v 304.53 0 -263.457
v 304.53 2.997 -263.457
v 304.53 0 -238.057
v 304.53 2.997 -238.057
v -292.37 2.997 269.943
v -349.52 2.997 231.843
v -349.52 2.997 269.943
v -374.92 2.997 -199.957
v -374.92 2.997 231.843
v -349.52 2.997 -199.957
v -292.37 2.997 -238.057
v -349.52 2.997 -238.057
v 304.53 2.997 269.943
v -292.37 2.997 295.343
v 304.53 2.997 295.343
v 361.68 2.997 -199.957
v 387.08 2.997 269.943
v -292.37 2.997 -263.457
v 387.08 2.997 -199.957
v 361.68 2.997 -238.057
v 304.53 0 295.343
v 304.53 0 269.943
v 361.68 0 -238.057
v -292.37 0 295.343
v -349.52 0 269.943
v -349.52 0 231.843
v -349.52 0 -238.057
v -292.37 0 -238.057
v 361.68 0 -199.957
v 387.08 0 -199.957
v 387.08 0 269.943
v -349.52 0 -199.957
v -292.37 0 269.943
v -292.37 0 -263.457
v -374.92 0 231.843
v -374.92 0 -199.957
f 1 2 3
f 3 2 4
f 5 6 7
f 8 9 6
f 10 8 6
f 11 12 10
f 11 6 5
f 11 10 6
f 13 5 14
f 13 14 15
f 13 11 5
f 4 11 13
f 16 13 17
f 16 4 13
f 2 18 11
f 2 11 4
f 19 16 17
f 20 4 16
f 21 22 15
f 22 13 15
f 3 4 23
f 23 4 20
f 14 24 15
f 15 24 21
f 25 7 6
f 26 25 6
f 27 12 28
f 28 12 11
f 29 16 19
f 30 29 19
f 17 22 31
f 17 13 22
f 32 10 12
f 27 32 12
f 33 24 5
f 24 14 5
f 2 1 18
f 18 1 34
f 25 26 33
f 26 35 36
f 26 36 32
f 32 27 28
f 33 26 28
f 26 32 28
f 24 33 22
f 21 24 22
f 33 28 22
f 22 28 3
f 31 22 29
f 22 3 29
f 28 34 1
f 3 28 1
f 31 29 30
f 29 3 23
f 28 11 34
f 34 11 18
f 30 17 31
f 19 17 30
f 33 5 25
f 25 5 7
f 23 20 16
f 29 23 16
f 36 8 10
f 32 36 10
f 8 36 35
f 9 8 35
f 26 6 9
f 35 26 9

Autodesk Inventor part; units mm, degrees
ref_plane "YZ Plane" through (0, 0, 0) normal (1, 0, 0) x (0, 1, 0)
sketch "Sketch1" plane through (0, 0, 0) normal (0, 1, 0) x (-1, 0, 0)
  line L0 (374.9202, 295.3426) -> (-387.0798, 295.3426)
  line L1 (-387.0798, 295.3426) -> (-387.0798, -263.4574)
  line L2 (-387.0798, -263.4574) -> (374.9202, -263.4574)
  line L3 (374.9202, -263.4574) -> (374.9202, 295.3426)
  point P0 (0, 0)
  dimension "d0" = 558.8
  dimension "d1" = 762
extrude "Extrusion1" add sketch "Sketch1" along normal blind 2.9972
sketch "Sketch2" plane through (0, 2.9972, 0) normal (0, 1, 0) x (1, 0, 0)
  line L0 (-374.9202, -231.8426) -> (-374.9202, -295.3426)
  line L1 (-374.9202, -295.3426) -> (-292.3702, -295.3426)
  line L2 (-292.3702, -295.3426) -> (-292.3702, -269.9426)
  line L3 (-292.3702, -269.9426) -> (-349.5202, -269.9426)
  line L4 (-349.5202, -269.9426) -> (-349.5202, -231.8426)
  line L5 (-349.5202, -231.8426) -> (-374.9202, -231.8426)
  line L6 (-374.9202, 263.4574) -> (-374.9202, -295.3426) projected
  line L7 (-374.9202, -295.3426) -> (387.0798, -295.3426) projected
  point P0 (0, 0)
  dimension "d4" = 63.5
  dimension "d5" = 82.55
  dimension "d6" = 25.4
  dimension "d7" = 25.4
extrude "Extrusion2" cut sketch "Sketch2" against normal blind 2.9972
ref_plane "Work Plane3" through (-292.3702, 0, 15.9426) normal (0, 0, 1) x (1, 0, 0)
mirror "Mirror1" about plane through (-292.3702, 0, 15.9426) normal (0, 0, 1) of "Extrusion2"
ref_plane "Work Plane4" through (6.0798, 0, -199.9574) normal (-1, 0, 0) x (0, 0, 1)
mirror "Mirror2" about plane through (6.0798, 0, -199.9574) normal (-1, 0, 0) of "Extrusion2", "Mirror1"
sketch "Sketch3" plane through (0, 2.9972, 0) normal (0, 1, 0) x (1, 0, 0)
  line L0 (387.0798, -231.8426) -> (387.0798, 199.9574) projected
  line L1 (304.5298, -269.9426) -> (361.6798, -269.9426) projected
  line L2 (387.0798, -231.8426) -> (361.6798, -231.8426)
  line L3 (361.6798, -231.8426) -> (361.6798, -269.9426)
  line L4 (361.6798, -269.9426) -> (387.0798, -269.9426)
  line L5 (387.0798, -269.9426) -> (387.0798, -231.8426)
  point P0 (0, 0)
extrude "Extrusion3" add sketch "Sketch3" against normal blind 2.9972
properties part number "Cut Lexan DriveTrain" material "Polycarbonate, Clear"
